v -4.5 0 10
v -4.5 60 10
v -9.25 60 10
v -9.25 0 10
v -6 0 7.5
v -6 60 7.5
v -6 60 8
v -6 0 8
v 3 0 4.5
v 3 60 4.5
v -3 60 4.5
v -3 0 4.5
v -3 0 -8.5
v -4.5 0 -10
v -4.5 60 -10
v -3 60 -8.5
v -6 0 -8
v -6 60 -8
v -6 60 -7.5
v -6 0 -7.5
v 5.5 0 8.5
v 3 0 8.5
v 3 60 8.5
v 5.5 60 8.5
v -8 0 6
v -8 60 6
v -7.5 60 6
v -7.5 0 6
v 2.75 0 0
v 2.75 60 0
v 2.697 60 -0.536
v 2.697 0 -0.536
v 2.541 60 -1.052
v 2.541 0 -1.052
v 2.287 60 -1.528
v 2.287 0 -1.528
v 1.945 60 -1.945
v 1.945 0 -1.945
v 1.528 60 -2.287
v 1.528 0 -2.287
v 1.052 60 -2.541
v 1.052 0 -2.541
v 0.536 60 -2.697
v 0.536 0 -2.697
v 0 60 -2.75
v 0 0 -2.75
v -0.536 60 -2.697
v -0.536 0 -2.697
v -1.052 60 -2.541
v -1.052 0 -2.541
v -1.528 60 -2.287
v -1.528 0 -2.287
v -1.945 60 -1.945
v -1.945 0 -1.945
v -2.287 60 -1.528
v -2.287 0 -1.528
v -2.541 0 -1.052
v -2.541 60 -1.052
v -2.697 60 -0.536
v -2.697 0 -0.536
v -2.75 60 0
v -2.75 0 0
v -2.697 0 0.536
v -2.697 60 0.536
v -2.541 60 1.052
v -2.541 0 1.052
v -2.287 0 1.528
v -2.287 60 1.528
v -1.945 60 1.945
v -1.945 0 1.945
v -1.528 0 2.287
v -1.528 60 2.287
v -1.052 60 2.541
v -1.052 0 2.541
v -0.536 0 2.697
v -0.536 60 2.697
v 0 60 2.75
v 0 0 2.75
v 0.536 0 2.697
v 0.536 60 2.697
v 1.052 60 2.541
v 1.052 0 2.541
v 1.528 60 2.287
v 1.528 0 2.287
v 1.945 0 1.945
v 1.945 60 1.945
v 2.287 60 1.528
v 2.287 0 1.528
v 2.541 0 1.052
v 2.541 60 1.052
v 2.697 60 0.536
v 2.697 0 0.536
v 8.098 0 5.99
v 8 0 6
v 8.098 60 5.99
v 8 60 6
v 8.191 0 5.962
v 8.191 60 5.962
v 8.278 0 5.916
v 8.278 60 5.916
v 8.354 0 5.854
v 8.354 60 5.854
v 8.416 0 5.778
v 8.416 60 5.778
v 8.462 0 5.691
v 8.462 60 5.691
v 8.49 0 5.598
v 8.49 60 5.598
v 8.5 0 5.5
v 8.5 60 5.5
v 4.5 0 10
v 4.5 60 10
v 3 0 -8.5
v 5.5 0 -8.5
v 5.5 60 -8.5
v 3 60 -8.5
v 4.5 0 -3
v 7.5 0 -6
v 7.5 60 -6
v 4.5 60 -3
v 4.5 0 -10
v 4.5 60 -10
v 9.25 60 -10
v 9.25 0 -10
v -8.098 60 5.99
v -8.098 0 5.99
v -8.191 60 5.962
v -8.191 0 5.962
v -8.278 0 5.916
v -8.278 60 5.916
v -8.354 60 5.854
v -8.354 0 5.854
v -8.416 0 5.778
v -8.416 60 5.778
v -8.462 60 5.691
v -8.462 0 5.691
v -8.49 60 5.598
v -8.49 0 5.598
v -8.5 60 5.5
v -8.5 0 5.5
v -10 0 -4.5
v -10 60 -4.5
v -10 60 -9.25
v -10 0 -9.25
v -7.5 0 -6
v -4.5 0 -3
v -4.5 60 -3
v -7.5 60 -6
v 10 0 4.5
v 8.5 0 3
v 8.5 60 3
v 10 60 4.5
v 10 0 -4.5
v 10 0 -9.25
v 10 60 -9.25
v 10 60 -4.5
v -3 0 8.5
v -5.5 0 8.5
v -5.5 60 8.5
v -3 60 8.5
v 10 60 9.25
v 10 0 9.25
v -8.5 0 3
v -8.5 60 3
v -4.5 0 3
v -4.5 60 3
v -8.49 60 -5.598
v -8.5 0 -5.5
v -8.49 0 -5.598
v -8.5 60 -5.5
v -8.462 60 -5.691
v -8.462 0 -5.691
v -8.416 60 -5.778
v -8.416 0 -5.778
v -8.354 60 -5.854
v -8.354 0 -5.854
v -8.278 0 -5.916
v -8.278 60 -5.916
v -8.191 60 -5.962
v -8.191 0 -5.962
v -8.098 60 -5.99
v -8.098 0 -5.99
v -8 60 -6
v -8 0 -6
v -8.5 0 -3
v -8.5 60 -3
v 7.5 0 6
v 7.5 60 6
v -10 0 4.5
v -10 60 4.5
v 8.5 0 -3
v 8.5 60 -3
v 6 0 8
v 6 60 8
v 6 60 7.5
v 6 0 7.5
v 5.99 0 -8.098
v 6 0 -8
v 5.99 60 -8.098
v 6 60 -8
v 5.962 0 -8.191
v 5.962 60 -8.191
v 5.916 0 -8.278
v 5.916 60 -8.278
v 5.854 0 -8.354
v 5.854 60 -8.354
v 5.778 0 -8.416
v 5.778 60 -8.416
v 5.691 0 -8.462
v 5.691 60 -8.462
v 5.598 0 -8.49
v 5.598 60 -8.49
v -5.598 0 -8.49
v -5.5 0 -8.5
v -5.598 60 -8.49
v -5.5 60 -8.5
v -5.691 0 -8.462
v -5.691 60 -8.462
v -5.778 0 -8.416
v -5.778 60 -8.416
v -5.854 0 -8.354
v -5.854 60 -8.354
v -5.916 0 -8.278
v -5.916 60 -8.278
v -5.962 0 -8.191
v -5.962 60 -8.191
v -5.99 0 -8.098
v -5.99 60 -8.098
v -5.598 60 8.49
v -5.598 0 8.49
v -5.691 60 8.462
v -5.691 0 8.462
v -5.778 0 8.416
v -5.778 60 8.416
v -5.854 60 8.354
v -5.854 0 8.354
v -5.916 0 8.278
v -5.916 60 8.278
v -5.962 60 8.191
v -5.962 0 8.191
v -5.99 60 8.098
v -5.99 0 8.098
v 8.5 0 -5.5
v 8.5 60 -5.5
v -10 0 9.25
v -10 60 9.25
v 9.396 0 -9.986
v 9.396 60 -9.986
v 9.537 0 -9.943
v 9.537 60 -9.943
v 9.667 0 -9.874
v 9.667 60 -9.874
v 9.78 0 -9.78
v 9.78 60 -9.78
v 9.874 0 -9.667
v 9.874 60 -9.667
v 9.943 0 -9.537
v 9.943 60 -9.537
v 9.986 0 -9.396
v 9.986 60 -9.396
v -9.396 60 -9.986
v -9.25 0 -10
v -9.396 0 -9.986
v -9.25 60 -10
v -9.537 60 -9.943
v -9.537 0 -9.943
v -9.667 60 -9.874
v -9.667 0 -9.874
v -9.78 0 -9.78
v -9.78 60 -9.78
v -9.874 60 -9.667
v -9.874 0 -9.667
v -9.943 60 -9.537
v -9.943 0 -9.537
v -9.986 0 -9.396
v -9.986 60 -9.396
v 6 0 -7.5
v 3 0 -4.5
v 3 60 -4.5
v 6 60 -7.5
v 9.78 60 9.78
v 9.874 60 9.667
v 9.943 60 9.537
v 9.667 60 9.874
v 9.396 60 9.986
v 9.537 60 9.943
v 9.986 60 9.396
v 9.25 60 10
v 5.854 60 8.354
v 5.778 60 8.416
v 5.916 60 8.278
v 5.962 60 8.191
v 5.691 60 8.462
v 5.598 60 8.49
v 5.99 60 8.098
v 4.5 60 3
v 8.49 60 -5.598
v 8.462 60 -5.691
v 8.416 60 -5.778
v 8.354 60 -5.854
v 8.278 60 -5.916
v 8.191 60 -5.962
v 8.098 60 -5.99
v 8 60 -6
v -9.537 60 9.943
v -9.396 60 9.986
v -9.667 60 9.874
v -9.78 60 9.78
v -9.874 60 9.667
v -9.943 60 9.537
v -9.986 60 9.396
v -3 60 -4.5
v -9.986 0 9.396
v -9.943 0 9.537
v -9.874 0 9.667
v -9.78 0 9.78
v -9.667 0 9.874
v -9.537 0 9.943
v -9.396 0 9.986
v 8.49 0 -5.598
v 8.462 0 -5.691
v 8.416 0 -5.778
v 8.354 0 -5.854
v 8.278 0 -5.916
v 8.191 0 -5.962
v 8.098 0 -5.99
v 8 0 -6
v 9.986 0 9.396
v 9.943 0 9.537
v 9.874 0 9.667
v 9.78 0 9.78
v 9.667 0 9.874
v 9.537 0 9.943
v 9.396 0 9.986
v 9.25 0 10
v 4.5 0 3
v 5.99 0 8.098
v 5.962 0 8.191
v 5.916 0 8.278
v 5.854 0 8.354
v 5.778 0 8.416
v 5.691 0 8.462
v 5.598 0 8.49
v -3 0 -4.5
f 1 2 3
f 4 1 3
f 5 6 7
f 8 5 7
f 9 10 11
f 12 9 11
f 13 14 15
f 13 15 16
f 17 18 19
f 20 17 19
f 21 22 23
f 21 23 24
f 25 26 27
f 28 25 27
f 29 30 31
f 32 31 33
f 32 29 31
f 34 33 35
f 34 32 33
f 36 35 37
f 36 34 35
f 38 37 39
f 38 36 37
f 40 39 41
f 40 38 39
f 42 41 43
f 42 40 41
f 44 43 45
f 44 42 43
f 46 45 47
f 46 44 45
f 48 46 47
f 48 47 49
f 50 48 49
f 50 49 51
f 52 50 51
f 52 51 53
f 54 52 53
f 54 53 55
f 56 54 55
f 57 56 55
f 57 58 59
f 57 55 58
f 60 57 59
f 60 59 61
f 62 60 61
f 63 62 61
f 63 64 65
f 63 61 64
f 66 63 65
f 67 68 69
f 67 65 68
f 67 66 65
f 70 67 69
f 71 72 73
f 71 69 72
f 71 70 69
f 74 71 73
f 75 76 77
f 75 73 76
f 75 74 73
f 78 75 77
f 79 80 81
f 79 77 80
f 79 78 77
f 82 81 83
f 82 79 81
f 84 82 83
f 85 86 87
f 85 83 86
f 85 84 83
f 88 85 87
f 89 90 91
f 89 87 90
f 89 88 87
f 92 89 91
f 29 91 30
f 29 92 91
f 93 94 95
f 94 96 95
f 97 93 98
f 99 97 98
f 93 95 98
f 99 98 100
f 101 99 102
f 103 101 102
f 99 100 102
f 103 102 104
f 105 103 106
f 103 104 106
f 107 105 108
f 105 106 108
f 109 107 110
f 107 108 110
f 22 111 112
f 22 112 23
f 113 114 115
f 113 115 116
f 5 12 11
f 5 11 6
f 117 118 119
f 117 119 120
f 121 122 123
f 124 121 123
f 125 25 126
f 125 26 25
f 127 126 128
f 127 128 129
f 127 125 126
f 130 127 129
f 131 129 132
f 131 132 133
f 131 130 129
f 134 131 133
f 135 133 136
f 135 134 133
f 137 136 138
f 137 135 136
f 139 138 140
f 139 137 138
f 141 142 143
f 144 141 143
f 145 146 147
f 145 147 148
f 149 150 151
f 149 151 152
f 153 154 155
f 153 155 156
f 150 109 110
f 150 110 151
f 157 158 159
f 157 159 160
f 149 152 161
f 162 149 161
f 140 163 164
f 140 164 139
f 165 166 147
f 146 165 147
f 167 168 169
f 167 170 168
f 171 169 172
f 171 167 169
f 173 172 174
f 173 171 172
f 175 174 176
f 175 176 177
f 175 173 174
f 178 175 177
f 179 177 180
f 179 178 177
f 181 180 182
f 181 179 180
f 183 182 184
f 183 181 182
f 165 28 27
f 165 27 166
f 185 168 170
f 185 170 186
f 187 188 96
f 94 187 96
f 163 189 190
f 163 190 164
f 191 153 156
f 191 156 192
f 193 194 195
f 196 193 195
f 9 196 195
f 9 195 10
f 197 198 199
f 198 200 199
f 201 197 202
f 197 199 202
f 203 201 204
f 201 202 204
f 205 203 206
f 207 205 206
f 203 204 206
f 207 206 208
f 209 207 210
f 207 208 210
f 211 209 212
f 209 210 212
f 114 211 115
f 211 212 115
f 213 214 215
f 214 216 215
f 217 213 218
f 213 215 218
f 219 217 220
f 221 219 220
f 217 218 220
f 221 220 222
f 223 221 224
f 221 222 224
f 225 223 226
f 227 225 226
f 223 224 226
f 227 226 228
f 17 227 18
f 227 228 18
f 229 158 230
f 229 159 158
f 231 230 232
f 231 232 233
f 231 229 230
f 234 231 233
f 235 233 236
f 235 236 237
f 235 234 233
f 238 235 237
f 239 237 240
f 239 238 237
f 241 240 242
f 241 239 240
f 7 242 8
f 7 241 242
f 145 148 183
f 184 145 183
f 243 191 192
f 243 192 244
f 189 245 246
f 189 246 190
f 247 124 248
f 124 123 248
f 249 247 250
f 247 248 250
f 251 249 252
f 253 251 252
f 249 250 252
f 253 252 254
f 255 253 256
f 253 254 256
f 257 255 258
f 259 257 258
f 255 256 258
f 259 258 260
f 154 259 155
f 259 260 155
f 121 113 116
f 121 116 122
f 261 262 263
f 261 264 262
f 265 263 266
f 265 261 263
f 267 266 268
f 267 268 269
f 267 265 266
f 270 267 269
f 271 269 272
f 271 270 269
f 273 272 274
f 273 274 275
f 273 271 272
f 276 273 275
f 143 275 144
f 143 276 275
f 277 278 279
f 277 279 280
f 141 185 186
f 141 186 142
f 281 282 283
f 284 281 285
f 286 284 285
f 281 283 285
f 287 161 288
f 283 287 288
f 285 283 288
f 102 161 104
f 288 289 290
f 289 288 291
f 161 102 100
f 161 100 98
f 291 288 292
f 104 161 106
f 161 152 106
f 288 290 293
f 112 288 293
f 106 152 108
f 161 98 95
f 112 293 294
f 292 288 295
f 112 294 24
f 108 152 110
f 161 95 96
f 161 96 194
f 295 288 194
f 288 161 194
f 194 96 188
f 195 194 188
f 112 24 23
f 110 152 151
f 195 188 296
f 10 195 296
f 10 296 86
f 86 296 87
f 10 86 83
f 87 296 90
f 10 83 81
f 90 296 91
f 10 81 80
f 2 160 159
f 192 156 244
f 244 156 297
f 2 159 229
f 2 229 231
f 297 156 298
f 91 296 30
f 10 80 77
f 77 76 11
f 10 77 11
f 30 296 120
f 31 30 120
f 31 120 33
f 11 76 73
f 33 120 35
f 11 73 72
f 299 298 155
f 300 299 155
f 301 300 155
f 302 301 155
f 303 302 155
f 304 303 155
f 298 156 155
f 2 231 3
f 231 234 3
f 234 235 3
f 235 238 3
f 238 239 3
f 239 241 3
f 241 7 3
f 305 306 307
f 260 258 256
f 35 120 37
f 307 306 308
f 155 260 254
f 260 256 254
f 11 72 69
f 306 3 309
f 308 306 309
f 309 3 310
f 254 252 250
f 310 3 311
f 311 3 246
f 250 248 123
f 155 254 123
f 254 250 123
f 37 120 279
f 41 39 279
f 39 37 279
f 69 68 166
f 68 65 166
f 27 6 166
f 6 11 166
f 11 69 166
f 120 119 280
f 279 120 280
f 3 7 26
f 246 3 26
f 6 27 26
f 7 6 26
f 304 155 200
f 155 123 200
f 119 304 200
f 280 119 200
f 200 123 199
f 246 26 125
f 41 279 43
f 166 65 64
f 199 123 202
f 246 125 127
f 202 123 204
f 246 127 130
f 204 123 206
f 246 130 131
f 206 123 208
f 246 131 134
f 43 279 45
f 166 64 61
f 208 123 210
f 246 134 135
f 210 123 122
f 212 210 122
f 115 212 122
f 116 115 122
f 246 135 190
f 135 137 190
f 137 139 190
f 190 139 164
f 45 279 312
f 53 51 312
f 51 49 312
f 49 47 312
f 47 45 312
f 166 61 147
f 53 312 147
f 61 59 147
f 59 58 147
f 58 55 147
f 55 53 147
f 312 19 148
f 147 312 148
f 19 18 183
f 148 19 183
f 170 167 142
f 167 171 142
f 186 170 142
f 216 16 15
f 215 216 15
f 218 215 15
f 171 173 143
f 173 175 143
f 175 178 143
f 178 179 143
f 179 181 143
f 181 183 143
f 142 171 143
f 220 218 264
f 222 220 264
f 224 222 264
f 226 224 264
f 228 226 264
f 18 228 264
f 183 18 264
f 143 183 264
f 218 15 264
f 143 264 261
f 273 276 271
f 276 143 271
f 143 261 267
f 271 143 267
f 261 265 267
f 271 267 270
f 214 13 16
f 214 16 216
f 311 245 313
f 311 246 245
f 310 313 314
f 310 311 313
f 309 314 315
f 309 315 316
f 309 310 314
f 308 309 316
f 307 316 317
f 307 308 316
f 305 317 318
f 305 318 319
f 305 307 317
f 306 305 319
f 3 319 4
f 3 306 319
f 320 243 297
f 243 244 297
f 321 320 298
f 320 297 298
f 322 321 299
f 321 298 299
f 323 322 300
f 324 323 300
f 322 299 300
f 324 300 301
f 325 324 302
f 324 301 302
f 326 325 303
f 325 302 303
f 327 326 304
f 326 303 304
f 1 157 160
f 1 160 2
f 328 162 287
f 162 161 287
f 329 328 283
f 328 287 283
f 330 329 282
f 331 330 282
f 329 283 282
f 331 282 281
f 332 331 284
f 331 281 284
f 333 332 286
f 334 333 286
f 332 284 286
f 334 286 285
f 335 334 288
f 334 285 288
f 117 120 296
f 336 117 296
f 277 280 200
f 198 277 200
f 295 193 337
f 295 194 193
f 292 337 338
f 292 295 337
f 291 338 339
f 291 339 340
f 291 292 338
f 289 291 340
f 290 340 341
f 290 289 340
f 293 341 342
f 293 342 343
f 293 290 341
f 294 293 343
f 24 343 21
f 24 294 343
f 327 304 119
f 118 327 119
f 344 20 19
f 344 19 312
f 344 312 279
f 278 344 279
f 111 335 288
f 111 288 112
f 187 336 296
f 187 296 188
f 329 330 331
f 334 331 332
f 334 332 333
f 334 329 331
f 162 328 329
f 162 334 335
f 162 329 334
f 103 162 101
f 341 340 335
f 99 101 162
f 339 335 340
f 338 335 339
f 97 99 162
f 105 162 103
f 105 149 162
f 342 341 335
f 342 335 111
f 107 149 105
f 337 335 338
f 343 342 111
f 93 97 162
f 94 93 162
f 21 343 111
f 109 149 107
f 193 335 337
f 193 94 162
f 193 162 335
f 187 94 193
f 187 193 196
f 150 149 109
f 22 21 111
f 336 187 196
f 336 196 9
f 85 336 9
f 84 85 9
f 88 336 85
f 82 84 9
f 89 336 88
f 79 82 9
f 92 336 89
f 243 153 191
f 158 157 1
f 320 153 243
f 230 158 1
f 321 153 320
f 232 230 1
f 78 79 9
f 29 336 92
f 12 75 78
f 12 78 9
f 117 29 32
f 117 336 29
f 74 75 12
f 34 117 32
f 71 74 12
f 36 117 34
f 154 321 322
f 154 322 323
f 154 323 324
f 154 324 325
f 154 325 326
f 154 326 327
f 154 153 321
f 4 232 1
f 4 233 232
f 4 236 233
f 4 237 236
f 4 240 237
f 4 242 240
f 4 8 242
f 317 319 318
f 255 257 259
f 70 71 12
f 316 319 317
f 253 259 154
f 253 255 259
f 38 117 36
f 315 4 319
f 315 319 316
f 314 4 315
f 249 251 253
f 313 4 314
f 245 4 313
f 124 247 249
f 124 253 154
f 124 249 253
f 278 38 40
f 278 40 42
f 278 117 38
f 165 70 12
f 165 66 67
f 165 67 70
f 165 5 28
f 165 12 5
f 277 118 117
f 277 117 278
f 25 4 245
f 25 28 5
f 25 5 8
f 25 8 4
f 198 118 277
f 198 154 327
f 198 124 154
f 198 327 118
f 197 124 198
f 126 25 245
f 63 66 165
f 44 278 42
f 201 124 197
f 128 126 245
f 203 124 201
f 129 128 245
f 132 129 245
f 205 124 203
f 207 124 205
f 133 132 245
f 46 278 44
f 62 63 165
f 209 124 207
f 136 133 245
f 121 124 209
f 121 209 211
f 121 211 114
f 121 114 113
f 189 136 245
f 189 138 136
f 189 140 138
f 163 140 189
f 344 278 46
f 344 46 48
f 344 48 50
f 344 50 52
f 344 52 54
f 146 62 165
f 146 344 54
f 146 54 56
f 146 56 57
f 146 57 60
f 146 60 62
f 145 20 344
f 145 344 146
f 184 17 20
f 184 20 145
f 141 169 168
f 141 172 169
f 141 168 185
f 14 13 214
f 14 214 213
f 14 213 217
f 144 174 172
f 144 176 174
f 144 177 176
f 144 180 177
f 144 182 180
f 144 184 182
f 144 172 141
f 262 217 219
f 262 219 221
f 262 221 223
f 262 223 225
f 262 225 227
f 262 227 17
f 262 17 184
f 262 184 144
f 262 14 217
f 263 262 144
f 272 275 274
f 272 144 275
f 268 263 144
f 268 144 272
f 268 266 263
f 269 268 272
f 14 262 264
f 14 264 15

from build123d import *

# Parameters (mm, degrees)
BOSS_EXTRUDE2_DEPTH = 60
SKETCH1_3_R         = 2.75
CUT_EXTRUDE4_DEPTH  = 80
FILLET7_R           = 0.75
FILLET8_R           = 0.5


with BuildPart() as part:
    # Sketch1 → Boss-Extrude2 (new body)
    with BuildSketch(Plane(origin=(0, 0, 0), x_dir=(1, 0, 0), z_dir=(0, 1, 0))):
        Polygon((-3, 4.5), (3, 4.5), (6, 7.5), (6, 8.5), (3, 8.5), (4.5, 10), (10, 10), (10, 4.5), (8.5, 3), (8.5, 6), (7.5, 6), (4.5, 3), (4.5, -3), (7.5, -6), (8.5, -6), (8.5, -3), (10, -4.5), (10, -10), (4.5, -10), (3, -8.5), (6, -8.5), (6, -7.5), (3, -4.5), (-3, -4.5), (-6, -7.5), (-6, -8.5), (-3, -8.5), (-4.5, -10), (-10, -10), (-10, -4.5), (-8.5, -3), (-8.5, -6), (-7.5, -6), (-4.5, -3), (-4.5, 3), (-7.5, 6), (-8.5, 6), (-8.5, 3), (-10, 4.5), (-10, 10), (-4.5, 10), (-3, 8.5), (-6, 8.5), (-6, 7.5), align=None)
    extrude(amount=BOSS_EXTRUDE2_DEPTH)

    # Sketch1<3> → Cut-Extrude4 (cut)
    with BuildSketch(Plane(origin=(0, 0, 0), x_dir=(1, 0, 0), z_dir=(0, 1, 0))):
        Circle(SKETCH1_3_R)
    extrude(amount=CUT_EXTRUDE4_DEPTH, mode=Mode.SUBTRACT)

    # Fillet7
    fillet7_edges = [part.edges().sort_by_distance(p)[0] for p in [
        (-10, 30, -10),
        (10, 30, -10),
        (10, 30, 10),
        (-10, 30, 10),
    ]]
    fillet(fillet7_edges, radius=FILLET7_R)

    # Fillet8
    fillet8_edges = [part.edges().sort_by_distance(p)[0] for p in [
        (-6, 30, -8.5),
        (6, 30, -8.5),
        (8.5, 30, -6),
        (8.5, 30, 6),
        (6, 30, 8.5),
        (-6, 30, 8.5),
        (-8.5, 30, 6),
        (-8.5, 30, -6),
    ]]
    fillet(fillet8_edges, radius=FILLET8_R)


solid = part.part
